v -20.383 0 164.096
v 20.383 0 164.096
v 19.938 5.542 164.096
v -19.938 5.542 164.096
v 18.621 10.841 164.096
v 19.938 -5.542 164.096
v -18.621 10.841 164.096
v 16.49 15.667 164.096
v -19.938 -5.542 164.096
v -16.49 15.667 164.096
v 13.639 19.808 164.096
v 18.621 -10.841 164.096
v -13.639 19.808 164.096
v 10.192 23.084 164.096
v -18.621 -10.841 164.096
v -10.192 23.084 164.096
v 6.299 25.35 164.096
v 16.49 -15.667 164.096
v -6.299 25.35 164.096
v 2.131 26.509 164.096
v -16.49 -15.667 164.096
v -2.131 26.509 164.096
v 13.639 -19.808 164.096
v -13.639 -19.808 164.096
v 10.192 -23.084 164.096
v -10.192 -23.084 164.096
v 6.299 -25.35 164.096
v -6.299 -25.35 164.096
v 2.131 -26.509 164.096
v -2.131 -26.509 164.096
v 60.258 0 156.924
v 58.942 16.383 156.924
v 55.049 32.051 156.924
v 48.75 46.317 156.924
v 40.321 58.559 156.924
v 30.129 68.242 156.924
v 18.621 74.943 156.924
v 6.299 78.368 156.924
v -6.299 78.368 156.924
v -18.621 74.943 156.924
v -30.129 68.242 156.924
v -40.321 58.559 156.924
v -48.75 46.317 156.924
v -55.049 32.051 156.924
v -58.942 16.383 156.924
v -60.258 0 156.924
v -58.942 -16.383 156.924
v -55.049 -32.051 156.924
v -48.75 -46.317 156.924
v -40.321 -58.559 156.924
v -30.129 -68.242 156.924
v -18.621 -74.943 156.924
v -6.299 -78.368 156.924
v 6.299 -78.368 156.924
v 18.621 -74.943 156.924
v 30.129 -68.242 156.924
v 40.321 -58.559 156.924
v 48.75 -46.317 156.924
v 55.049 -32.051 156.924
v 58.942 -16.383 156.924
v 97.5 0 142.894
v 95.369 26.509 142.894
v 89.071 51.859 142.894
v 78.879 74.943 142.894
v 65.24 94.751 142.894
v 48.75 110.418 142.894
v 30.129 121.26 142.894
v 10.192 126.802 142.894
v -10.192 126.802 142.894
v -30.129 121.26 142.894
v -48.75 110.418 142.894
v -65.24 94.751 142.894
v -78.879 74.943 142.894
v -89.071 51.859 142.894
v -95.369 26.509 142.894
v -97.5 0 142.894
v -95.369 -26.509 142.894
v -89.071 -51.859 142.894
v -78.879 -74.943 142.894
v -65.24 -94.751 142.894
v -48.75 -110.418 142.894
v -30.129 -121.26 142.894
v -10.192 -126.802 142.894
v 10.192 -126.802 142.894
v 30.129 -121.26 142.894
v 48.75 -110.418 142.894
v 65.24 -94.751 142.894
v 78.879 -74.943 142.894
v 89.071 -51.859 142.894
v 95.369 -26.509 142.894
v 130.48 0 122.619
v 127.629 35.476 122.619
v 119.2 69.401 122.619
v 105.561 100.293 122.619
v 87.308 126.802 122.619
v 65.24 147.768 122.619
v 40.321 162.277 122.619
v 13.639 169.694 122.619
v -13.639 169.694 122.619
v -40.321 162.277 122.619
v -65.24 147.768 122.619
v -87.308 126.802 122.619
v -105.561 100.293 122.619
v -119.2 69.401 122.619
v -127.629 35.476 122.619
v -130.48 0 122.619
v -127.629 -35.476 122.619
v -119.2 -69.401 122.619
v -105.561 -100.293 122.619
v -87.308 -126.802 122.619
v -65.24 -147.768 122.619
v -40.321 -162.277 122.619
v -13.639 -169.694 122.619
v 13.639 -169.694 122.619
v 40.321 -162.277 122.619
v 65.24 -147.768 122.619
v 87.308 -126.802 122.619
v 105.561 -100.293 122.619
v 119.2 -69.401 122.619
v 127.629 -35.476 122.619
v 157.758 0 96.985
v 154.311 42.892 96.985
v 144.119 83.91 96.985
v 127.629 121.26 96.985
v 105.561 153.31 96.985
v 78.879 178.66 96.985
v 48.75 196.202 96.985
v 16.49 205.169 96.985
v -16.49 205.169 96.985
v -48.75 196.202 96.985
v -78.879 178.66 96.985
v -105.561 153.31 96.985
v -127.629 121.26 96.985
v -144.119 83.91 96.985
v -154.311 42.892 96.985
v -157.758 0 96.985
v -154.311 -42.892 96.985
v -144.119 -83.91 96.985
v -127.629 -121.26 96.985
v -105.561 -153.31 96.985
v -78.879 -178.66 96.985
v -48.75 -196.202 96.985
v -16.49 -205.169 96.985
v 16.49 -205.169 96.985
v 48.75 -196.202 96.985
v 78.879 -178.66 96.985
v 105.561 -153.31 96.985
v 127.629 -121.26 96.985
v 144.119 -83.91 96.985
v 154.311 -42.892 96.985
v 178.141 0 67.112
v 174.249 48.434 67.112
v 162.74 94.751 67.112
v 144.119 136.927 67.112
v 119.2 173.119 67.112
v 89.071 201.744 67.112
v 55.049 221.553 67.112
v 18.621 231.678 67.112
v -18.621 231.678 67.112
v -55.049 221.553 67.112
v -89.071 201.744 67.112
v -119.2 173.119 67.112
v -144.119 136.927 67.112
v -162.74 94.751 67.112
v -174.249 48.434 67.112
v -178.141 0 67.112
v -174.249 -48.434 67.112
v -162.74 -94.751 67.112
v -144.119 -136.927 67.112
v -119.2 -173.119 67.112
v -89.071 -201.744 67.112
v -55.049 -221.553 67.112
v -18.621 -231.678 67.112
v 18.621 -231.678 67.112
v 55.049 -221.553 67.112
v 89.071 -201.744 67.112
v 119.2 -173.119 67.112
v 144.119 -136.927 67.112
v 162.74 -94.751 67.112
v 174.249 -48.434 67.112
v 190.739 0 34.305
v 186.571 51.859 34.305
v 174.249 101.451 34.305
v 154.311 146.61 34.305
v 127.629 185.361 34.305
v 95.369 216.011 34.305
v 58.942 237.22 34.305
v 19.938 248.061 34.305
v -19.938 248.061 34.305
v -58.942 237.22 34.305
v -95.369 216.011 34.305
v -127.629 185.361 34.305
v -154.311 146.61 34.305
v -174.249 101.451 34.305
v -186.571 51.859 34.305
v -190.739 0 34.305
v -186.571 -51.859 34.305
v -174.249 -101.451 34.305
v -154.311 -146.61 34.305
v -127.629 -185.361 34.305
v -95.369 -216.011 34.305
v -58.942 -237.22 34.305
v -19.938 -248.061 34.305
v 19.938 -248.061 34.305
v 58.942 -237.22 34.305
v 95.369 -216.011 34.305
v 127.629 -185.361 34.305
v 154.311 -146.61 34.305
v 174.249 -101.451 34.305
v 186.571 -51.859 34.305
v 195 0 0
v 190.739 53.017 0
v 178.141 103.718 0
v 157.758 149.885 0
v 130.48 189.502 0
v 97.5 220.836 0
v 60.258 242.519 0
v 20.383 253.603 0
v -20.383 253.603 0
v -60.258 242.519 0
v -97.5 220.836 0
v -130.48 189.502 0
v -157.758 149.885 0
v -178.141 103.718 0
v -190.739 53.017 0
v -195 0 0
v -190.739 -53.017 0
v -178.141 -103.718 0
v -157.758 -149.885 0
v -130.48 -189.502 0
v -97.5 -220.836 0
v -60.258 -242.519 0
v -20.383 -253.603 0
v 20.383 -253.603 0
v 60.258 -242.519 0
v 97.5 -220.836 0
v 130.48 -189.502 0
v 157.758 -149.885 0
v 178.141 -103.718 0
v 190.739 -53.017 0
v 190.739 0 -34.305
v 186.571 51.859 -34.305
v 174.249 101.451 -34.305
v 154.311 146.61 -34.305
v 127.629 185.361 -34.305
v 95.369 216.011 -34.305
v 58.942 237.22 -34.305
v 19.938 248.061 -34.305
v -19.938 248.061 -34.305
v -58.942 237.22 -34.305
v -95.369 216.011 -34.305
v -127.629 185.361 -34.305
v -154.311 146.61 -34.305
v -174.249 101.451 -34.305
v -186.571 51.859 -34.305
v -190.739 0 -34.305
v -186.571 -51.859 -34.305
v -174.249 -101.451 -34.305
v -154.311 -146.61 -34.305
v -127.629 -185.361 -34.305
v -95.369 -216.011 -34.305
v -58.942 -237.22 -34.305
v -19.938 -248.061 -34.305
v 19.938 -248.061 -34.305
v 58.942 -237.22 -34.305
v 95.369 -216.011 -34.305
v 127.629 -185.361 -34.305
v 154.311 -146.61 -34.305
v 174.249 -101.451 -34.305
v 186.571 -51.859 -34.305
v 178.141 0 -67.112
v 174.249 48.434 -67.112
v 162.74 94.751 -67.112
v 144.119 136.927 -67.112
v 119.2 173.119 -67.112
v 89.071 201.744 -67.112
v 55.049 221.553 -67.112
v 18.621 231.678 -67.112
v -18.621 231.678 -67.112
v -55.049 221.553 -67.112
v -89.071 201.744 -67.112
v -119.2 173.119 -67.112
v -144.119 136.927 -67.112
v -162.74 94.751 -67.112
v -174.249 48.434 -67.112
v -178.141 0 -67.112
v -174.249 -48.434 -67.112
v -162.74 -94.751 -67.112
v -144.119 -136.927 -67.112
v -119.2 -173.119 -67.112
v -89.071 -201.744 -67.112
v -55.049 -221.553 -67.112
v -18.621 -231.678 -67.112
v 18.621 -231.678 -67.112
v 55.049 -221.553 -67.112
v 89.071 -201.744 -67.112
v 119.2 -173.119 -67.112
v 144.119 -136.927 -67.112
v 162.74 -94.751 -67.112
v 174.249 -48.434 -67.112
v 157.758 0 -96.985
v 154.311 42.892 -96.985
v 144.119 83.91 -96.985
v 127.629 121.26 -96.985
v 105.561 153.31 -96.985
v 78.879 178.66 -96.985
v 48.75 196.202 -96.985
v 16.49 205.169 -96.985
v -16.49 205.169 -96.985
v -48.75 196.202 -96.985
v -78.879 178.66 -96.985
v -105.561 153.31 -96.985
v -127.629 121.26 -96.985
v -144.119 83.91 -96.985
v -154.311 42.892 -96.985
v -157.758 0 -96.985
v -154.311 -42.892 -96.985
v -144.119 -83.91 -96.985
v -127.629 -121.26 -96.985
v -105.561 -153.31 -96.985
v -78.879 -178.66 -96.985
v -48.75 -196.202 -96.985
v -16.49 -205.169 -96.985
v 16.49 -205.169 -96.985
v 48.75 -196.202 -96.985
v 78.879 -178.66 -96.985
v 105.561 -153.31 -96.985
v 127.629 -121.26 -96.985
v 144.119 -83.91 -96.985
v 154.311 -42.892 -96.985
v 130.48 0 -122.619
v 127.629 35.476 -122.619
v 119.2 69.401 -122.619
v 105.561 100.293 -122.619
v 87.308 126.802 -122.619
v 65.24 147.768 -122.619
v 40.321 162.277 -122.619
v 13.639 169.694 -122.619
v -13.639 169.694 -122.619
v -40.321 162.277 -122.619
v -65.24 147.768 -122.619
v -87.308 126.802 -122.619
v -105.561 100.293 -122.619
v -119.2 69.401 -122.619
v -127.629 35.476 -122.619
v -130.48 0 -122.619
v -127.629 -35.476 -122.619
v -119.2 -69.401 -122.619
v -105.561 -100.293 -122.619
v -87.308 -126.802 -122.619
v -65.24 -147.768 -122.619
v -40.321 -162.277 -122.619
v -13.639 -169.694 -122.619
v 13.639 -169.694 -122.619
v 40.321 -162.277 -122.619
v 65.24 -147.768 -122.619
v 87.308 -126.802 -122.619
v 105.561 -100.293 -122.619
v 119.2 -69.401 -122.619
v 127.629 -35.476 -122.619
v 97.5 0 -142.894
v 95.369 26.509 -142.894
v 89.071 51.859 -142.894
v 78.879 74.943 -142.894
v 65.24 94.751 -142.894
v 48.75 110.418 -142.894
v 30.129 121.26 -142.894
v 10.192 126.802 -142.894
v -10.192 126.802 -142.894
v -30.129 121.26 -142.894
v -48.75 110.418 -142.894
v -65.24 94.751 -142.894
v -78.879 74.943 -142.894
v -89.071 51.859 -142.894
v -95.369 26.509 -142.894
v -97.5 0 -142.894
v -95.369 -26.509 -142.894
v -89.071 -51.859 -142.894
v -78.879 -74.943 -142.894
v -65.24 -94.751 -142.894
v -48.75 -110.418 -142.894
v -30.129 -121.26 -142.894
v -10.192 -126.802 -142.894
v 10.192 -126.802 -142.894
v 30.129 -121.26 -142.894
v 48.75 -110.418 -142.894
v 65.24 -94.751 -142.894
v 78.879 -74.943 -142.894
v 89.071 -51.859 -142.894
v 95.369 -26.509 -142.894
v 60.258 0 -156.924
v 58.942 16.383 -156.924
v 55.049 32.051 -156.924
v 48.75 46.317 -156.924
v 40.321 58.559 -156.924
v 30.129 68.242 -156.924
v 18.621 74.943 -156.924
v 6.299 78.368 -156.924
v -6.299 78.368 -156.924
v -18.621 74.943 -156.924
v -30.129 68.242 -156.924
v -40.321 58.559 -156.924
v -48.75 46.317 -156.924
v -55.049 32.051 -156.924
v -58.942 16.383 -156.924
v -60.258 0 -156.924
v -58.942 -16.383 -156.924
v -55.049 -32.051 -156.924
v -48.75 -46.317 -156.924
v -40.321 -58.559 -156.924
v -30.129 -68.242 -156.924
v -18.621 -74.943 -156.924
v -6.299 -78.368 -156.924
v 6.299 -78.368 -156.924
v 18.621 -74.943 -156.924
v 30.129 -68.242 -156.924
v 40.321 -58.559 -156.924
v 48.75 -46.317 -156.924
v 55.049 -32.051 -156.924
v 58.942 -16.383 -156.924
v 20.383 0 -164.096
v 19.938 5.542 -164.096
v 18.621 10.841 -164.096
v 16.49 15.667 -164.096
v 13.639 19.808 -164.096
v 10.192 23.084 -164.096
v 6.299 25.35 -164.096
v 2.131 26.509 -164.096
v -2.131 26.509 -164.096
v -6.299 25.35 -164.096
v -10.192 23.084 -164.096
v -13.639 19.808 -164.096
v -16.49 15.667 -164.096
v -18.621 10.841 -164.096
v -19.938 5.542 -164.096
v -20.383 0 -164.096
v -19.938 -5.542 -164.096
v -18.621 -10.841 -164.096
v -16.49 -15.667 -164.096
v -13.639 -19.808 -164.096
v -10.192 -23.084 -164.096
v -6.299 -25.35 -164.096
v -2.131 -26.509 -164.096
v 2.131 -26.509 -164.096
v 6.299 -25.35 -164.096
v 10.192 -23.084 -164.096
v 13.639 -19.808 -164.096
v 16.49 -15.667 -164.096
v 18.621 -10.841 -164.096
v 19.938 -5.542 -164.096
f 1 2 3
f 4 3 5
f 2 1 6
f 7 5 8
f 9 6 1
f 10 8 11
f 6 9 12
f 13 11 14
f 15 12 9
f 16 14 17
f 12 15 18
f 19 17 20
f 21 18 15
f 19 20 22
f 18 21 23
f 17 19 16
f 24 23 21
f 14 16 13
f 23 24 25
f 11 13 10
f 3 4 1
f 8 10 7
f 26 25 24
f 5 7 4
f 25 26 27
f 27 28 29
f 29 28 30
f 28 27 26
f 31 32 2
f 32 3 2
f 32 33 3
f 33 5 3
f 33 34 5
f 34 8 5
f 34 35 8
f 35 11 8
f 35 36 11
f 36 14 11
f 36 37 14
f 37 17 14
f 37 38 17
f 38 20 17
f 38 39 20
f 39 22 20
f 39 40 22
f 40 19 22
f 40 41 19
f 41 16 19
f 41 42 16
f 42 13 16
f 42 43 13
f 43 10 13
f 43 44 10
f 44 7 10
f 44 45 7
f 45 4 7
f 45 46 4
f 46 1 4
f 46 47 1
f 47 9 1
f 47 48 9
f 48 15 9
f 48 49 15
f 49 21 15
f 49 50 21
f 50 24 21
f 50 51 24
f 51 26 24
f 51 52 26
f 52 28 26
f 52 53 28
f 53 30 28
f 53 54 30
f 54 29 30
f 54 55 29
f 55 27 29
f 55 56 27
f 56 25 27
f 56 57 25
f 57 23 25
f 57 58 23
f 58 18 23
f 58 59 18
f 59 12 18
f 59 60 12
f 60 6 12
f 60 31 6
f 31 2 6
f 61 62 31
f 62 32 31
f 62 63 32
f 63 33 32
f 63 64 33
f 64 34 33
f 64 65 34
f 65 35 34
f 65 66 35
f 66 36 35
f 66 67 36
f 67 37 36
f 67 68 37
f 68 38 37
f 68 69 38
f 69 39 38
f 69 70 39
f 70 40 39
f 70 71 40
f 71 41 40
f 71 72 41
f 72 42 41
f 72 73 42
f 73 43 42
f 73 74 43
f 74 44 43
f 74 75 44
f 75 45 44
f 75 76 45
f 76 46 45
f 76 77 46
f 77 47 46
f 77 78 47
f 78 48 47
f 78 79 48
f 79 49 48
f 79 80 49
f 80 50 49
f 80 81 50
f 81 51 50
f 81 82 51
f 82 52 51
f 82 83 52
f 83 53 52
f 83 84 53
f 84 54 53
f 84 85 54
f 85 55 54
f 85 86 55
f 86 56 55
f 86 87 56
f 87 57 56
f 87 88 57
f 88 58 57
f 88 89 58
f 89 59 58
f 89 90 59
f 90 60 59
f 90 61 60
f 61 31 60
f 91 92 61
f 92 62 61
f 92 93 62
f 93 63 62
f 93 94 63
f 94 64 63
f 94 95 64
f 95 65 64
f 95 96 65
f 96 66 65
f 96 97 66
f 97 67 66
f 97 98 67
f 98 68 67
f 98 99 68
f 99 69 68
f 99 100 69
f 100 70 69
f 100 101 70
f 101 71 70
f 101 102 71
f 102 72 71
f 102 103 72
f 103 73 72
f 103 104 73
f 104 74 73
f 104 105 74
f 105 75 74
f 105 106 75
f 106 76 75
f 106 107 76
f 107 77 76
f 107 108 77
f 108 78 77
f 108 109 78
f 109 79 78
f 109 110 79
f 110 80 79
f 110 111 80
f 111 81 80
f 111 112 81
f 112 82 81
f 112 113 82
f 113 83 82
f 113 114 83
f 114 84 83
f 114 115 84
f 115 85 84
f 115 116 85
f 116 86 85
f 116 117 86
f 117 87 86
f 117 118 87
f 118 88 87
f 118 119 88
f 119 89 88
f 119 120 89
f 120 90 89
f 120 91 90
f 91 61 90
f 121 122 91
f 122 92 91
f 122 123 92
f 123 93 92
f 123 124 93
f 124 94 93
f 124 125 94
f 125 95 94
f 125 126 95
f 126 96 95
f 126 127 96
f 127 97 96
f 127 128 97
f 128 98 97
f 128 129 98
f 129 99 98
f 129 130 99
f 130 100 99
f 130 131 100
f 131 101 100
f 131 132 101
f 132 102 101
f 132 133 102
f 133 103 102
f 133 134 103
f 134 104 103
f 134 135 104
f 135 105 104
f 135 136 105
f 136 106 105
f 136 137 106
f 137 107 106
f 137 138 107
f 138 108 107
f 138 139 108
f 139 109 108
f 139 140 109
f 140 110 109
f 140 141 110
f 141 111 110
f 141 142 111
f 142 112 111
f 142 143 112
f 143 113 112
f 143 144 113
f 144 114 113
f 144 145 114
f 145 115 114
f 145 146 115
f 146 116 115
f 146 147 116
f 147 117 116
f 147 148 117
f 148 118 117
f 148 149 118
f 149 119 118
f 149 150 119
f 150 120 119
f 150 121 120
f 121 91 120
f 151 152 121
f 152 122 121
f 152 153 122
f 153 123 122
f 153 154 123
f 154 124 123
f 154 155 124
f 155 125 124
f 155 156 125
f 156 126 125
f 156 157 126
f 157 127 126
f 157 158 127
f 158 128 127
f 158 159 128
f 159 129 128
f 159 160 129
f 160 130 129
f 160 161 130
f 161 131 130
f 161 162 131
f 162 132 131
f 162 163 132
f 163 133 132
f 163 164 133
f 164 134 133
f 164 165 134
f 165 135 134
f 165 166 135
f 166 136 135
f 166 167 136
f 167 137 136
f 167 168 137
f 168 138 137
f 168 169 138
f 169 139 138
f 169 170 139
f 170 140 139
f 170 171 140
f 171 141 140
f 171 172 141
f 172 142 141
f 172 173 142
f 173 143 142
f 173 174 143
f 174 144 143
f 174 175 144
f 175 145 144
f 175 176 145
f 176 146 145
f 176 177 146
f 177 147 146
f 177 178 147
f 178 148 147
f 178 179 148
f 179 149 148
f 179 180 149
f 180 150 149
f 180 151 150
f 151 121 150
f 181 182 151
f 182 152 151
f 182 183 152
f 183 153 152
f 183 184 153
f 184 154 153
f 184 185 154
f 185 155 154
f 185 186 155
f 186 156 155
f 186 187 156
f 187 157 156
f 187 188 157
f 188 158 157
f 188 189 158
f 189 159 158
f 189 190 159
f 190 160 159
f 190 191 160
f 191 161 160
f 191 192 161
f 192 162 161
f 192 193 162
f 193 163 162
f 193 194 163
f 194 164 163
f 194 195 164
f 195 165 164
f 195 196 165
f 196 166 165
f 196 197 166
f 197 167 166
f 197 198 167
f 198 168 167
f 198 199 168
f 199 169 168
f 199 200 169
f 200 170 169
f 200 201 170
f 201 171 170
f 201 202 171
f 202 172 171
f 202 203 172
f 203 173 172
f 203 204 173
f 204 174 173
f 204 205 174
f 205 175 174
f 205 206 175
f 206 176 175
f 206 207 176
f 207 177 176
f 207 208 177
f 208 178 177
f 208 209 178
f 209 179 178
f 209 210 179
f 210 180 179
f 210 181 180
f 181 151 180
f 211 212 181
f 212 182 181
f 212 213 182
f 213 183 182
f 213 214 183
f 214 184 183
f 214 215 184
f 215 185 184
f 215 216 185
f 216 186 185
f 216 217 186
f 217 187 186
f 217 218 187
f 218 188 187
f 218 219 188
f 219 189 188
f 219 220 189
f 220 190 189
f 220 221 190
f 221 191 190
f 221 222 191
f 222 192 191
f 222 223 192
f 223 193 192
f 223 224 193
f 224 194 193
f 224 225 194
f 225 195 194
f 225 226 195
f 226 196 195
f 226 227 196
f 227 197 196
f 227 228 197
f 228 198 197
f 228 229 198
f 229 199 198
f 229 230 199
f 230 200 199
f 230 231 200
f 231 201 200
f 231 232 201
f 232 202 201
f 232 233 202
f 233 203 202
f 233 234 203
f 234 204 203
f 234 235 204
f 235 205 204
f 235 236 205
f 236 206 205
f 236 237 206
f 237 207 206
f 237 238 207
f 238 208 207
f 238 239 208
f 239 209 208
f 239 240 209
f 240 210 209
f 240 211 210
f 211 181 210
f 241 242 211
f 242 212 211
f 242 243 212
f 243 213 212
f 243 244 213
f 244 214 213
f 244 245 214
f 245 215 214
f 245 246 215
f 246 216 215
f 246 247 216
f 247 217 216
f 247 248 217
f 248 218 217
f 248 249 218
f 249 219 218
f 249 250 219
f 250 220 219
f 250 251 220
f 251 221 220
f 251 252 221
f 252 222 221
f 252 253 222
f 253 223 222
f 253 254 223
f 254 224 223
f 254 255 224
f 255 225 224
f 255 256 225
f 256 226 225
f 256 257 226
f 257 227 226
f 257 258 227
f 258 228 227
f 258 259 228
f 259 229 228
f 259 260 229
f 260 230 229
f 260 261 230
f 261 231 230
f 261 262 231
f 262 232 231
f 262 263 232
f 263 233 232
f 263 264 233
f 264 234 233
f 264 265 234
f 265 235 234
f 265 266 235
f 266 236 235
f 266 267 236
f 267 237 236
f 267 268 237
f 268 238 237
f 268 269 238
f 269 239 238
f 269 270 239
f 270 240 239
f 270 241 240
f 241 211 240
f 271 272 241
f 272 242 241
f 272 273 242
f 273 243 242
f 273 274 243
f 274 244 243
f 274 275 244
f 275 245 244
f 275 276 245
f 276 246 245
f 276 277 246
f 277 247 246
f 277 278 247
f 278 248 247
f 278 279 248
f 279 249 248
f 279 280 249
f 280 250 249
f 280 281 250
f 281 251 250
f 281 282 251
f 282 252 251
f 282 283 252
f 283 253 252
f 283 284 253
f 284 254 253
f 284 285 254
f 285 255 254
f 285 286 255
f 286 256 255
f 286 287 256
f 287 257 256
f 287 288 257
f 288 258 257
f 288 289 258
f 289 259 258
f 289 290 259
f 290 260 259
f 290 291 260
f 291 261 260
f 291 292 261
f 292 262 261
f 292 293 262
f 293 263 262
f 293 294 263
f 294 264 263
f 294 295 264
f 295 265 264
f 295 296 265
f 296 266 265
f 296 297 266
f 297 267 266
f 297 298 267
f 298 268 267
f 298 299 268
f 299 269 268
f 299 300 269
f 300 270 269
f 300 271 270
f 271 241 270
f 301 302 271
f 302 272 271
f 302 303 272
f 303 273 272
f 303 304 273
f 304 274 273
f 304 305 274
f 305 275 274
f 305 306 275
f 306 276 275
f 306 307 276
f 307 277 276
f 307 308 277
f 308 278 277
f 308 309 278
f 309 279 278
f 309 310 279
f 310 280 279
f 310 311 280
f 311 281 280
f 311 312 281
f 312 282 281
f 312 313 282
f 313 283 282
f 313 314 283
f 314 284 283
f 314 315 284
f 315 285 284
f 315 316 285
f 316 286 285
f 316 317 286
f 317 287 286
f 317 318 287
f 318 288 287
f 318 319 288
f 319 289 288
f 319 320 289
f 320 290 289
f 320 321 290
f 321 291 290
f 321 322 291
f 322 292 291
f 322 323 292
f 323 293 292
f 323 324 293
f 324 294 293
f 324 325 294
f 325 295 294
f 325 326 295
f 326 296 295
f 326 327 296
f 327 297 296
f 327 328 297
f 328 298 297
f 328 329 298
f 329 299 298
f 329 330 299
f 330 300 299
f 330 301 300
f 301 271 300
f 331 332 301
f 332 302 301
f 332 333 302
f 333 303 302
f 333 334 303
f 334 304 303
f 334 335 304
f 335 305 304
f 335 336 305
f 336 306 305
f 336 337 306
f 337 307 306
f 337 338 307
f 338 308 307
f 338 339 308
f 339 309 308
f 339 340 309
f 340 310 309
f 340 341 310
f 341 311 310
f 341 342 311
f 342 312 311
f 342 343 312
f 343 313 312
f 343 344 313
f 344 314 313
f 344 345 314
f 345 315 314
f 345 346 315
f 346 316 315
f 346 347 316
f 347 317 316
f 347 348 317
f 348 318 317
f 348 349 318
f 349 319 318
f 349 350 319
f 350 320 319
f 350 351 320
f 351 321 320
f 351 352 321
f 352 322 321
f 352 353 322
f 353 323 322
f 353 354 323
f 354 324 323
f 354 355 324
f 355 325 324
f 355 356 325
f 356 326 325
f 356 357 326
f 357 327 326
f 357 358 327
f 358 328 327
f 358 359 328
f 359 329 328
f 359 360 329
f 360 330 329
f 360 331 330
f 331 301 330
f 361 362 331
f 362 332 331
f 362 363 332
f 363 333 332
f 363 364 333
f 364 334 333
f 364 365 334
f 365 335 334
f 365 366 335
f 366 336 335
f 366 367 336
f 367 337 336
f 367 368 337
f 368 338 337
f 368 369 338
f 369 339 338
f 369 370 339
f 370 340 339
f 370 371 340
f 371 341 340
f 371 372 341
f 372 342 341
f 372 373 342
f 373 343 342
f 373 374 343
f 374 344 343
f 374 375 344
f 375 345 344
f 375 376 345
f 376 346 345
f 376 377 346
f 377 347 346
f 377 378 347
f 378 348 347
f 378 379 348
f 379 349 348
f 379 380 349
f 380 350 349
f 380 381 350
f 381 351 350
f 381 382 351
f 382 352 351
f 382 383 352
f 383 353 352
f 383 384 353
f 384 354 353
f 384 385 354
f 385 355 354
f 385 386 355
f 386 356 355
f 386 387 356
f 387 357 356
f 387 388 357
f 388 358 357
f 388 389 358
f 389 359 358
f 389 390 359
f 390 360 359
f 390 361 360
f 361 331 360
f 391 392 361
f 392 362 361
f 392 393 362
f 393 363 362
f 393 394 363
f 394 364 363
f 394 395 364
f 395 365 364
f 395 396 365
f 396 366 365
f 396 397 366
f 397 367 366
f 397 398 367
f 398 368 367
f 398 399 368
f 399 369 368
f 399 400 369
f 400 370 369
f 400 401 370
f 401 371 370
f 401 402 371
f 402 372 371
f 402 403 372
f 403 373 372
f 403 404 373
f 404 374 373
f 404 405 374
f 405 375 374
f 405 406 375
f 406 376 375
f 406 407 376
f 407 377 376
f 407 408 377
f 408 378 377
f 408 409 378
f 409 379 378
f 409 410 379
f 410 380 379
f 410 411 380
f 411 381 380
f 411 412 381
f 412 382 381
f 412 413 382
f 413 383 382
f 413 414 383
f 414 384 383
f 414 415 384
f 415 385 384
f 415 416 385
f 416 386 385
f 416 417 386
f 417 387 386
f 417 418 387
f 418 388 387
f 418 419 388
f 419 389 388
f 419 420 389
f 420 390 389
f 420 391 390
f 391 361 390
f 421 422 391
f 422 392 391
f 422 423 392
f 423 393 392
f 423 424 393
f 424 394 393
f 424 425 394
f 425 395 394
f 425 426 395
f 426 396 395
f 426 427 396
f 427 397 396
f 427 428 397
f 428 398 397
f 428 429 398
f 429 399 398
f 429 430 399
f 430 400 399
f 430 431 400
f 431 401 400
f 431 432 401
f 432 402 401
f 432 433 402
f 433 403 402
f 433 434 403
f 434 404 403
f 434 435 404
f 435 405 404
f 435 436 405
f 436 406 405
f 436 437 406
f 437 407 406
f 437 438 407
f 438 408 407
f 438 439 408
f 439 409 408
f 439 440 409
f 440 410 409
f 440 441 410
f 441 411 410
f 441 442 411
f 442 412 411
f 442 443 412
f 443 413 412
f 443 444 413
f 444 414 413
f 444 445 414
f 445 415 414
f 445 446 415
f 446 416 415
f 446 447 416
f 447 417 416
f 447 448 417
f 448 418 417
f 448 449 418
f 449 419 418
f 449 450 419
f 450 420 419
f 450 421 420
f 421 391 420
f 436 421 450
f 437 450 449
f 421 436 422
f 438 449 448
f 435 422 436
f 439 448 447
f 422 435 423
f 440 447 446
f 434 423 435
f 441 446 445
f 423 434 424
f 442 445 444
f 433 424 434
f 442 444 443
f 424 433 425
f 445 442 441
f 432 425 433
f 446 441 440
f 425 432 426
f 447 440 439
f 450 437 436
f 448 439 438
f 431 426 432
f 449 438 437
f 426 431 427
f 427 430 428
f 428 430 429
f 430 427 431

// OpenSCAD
// Generated by SolidPython 1.0.1 on 2020-07-29 00:46:51


scale(v = [13, 17, 11]) {
	sphere(r = 15);
}
/***********************************************
*********      SolidPython code:      **********
************************************************
 
# import packages: SolidPython
from solid import *
from solid.utils import *
from itertools import chain, combinations, permutations


class Resize:

    def __init__(self, scad_file):
        self.scad_file = scad_file
        #self.scad_file = import_scad(scad_file)
        # cone/cylinder param:
        self.r1 = 0
        self.r2 = 0
        self.h = 0
        # rectangular prism param:
        self.w = 0
        self.l = 0
        # ellipse param:
        self.r = 0

    # import OpenScad code (file name corresponds to shape)


    # classify shape + parameters
    def assign(self, param1, param2, param3):
        if self.scad_file == 'cone.scad':
            self.r1 = param1
            self.r2 = param2
            self.h = param3
        elif self.scad_file == 'cylinder.scad':
            self.r1 = param1
            self.r2 = param2
            self.h = param3
        elif self.scad_file == 'rectangularPrism.scad':
            self.h = param1
            self.l = param2
            self.w = param3
        else:
            self.r = param1
            self.h = param2

    # resize parameters
    def iterate(self):
        x = range(3, 20, 2)
        i = 1
        if self.scad_file == 'cone.scad':
            tempList = list(permutations(x, 2))
            for temp in tempList:
                param1 = temp[0]
                param2 = temp[1]
                filepath = 'produced_scad_files/' + 'cone' + str(param1) + '_' + str(param2) + '_' + '.scad'
                scad_render_to_file(cylinder(h=param1, r1=param2, r2=0), filepath)

        elif self.scad_file == 'cylinder.scad':
            tempList = list(permutations(x, 3))
            for temp in tempList:
                param1 = temp[0]
                param2 = temp[1]
                filepath = 'produced_scad_files/' + 'cylinder' + str(param1) + '_' + str(param2) + '_' + '.scad'
                scad_render_to_file(cylinder(h=param1, r1=param2, r2=param2), filepath)

        elif self.scad_file == 'rectangularPrism.scad':
            tempList = list(permutations(x, 3))
            for temp in tempList:
                param1 = temp[0]
                param2 = temp[1]
                param3 = temp[2]
                filepath = 'produced_scad_files/' + 'rectangularPrism' + str(param1) + '_' + str(param2) + '_' + str(
                    param3) + '.scad'
                scad_render_to_file(cube(size=(param1, param2, param3)), filepath)

        elif self.scad_file == 'ellipse.scad':
            tempList = list(permutations(x, 4))
            for temp in tempList:
                param1 = temp[0]
                param2 = temp[1]
                param3 = temp[2]
                param4 = temp[3]
                filepath = 'produced_scad_files/' + 'ellipse' + str(param1) + '_' + str(param2) + '_' + str(param3) + '_' + str(param4) + '.scad'
                scad_render_to_file(scale([param1, param2, param3])(sphere(r=param4)), filepath)

    def render_to_scadfile(self):
        scad_render_to_file(scad, 'example.scad') 
 
************************************************/
